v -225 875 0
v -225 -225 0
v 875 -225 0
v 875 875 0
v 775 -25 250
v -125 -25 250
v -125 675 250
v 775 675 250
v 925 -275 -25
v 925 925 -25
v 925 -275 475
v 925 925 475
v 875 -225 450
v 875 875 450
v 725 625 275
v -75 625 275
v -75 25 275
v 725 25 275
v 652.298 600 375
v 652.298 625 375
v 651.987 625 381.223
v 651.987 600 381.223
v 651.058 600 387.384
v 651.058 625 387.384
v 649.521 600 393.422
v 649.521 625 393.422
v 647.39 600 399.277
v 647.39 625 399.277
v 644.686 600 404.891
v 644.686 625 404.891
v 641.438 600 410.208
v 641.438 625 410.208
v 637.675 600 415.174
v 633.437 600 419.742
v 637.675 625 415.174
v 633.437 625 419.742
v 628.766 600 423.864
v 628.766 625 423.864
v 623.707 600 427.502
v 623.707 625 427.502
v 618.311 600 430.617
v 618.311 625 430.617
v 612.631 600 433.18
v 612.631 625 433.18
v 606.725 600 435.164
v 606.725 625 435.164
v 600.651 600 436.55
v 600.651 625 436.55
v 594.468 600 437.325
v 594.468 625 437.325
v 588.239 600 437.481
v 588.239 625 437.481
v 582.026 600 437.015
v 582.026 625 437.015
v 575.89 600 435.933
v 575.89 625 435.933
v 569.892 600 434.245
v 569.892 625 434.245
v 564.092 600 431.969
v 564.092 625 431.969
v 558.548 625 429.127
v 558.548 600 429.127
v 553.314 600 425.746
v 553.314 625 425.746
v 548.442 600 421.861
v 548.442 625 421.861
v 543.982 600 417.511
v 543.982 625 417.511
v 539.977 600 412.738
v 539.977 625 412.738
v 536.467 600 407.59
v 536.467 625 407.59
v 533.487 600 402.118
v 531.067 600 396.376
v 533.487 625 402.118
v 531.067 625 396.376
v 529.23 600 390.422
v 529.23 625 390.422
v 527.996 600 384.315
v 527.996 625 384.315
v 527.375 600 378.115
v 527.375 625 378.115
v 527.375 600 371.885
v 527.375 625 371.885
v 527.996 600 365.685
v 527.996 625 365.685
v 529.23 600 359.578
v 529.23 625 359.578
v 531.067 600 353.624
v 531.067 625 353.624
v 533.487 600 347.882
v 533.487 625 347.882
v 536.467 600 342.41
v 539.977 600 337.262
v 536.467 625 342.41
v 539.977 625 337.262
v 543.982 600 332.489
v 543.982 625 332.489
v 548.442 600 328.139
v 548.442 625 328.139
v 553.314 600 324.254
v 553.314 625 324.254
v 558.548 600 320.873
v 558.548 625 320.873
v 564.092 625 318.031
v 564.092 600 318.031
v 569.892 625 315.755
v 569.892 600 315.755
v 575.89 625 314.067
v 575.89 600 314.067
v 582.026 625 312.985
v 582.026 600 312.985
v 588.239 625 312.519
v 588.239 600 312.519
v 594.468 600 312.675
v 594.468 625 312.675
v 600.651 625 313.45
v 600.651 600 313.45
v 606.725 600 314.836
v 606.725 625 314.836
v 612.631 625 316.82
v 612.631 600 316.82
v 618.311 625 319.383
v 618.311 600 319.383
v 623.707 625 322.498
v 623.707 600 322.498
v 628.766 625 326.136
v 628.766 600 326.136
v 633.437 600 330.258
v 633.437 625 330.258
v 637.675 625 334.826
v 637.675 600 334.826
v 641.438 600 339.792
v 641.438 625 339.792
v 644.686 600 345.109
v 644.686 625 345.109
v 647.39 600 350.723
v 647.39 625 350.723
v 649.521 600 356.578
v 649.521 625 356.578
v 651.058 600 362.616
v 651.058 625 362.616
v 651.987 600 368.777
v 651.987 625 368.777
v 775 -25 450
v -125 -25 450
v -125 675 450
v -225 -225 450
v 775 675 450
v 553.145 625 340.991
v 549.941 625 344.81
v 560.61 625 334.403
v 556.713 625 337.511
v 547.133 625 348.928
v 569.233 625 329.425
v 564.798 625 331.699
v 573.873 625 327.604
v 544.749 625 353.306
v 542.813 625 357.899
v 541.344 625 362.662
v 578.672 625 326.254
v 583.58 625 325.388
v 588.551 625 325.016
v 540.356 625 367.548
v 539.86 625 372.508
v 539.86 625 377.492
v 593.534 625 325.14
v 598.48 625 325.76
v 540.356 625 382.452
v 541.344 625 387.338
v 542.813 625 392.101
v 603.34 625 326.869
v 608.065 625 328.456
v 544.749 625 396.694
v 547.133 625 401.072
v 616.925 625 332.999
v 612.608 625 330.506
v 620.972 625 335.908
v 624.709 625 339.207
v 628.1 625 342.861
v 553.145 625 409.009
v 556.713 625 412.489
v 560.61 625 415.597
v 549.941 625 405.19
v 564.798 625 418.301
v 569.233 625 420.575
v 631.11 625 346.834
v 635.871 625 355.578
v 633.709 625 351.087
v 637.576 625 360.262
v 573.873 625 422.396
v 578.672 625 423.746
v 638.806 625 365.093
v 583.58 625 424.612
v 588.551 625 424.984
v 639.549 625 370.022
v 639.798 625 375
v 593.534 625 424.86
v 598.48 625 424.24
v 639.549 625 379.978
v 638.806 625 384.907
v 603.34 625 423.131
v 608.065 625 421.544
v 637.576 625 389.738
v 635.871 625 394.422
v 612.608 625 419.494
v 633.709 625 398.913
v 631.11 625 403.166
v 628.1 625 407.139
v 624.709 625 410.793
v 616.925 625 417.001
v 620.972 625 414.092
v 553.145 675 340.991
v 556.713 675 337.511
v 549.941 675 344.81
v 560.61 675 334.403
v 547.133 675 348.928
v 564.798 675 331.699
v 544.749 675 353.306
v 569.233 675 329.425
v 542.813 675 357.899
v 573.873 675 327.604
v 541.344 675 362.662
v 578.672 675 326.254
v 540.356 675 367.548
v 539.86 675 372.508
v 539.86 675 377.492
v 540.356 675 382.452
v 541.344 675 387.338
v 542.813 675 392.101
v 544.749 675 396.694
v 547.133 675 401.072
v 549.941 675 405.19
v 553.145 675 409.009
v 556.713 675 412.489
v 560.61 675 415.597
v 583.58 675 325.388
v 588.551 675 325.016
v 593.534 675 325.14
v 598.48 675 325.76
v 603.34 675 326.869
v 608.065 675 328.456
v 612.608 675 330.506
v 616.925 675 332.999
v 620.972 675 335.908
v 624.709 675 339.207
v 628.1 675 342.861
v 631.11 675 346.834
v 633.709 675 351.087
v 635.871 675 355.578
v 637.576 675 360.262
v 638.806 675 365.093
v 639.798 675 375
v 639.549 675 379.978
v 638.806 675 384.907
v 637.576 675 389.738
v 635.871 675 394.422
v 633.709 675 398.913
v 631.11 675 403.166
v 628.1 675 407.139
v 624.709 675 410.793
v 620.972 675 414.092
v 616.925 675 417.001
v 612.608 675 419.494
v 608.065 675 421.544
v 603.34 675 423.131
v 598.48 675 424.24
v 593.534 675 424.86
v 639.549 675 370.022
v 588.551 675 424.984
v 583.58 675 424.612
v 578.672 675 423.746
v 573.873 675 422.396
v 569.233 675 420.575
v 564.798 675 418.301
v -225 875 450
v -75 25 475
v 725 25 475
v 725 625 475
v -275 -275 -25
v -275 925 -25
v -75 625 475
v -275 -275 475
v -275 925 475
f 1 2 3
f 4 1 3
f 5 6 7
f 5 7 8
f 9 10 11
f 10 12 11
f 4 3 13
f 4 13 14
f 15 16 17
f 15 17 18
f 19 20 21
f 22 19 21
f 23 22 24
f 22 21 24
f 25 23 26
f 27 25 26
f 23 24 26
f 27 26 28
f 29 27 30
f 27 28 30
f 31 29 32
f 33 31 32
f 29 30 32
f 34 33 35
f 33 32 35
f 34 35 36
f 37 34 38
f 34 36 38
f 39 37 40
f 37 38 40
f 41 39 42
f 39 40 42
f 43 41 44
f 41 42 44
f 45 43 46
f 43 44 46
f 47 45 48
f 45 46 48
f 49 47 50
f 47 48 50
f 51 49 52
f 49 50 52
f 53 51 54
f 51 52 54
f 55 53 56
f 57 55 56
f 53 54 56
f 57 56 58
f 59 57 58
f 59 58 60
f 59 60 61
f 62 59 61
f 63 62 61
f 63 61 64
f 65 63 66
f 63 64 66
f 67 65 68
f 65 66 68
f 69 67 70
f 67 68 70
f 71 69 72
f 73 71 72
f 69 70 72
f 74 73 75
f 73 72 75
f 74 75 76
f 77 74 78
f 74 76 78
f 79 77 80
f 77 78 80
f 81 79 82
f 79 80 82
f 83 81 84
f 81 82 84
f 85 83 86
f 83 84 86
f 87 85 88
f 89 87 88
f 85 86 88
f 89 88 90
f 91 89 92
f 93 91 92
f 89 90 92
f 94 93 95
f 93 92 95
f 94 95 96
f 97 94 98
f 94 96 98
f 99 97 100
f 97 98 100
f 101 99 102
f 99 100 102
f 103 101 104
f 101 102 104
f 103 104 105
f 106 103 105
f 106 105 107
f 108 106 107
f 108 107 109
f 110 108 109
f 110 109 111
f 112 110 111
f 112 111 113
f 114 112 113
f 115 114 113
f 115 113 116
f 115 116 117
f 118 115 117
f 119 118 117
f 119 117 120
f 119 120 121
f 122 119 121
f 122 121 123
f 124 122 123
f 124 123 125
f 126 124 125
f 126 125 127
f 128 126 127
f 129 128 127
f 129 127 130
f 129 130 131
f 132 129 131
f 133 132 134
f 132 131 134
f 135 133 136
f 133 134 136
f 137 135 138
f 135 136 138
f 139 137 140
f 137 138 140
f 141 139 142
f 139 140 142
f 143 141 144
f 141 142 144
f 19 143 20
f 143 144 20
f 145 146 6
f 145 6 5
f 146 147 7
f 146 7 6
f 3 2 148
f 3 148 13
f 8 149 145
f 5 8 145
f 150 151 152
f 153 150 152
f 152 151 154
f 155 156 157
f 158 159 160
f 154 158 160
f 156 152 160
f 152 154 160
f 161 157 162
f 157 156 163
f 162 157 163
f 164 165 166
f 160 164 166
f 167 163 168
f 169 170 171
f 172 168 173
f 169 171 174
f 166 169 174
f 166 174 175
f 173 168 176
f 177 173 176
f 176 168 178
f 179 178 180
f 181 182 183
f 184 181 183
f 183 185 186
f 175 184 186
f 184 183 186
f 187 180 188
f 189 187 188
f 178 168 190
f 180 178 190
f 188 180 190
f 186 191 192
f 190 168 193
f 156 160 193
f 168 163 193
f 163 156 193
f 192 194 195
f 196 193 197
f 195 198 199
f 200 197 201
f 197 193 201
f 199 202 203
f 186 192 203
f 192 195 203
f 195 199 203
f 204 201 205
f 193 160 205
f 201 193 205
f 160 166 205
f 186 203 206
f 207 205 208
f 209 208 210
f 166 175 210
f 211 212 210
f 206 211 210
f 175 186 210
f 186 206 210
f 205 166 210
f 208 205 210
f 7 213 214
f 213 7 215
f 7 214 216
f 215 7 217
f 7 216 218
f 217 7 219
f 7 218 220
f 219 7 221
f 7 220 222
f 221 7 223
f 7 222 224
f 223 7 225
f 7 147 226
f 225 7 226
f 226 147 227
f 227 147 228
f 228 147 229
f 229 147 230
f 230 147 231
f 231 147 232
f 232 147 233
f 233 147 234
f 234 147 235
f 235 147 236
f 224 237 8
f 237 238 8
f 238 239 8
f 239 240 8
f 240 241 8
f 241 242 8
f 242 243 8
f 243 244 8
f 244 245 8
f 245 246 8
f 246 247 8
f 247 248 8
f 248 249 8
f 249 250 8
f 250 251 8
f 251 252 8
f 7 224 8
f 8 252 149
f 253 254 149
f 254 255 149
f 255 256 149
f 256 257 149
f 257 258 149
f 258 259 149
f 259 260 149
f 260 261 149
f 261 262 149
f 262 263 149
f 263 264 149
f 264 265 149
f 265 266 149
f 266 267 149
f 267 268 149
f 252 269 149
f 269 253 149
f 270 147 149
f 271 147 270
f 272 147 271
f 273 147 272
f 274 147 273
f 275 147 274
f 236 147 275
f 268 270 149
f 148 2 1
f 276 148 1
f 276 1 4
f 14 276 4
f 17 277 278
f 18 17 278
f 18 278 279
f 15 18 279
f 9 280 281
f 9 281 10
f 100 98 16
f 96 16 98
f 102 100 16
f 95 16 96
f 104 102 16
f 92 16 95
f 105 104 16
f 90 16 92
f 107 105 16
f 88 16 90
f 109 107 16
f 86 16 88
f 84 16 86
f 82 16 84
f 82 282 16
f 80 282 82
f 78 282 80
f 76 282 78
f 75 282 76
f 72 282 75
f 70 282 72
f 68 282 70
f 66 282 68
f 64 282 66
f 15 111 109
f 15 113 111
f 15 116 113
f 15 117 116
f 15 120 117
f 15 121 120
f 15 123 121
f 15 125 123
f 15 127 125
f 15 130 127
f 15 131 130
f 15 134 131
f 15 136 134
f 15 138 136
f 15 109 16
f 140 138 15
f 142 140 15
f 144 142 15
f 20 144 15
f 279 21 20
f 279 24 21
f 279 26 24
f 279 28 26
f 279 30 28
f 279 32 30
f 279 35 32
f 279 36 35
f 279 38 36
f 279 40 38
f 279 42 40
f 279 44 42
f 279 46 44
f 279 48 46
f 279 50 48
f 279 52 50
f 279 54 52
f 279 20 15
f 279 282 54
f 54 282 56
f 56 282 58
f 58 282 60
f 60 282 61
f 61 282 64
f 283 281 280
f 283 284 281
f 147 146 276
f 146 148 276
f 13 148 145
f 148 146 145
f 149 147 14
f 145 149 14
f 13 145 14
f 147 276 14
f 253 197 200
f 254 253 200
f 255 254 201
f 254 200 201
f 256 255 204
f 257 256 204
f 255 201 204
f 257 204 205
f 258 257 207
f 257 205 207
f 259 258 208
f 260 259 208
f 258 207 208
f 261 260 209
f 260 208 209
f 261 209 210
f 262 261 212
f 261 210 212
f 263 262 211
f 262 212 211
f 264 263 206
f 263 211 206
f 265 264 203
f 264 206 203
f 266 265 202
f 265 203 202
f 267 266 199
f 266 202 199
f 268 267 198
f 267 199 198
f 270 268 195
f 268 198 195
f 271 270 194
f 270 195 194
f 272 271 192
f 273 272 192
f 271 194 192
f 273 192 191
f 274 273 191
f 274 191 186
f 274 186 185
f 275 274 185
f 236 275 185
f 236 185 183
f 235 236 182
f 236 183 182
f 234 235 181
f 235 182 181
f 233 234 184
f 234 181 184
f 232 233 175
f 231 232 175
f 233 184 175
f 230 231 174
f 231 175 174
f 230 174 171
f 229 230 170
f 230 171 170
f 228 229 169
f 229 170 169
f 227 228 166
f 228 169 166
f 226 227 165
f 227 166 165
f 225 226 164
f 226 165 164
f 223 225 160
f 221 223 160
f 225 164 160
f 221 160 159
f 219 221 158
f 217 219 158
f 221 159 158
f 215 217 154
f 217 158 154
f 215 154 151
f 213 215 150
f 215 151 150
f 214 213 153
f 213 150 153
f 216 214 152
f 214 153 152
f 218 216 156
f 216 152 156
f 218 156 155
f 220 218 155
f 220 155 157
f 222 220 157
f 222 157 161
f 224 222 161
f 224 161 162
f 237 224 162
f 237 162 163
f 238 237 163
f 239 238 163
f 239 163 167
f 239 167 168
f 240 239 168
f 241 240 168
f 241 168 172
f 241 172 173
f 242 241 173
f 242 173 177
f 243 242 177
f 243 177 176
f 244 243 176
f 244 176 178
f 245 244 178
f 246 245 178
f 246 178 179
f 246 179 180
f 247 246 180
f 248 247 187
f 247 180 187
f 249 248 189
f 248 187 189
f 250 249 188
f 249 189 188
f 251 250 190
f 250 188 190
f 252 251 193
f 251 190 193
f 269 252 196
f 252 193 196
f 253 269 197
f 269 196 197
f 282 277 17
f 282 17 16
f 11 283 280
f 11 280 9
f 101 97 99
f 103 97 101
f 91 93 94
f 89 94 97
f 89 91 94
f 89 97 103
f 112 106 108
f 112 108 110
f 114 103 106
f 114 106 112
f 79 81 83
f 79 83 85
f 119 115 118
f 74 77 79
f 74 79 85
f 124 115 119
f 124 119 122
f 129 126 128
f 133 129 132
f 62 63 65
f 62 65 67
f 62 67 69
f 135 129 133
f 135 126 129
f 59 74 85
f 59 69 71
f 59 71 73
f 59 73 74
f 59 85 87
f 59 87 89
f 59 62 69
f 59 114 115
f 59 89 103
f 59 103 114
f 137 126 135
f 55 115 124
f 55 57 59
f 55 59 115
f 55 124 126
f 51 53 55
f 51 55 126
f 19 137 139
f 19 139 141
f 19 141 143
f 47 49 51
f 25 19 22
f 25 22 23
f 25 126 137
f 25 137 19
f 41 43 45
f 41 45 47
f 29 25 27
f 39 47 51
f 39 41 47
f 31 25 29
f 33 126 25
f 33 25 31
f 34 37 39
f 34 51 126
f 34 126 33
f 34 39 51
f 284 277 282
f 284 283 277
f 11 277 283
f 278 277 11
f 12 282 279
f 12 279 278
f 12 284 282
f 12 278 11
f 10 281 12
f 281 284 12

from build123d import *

# Parameters (mm, degrees)
F0_W      = 1200
F0_H      = 1200
F0_W_2    = 1100
F0_H_2    = 1100
F1_DEPTH  = 450
F2_W      = 1200
F2_H      = 1200
F2_W_2    = 1100
F2_H_2    = 1100
F3_DEPTH  = 25
F4_W      = 900
F4_H      = 700
F5_DEPTH  = 200
F6_W      = 1200
F6_H      = 1200
F6_W_2    = 1100
F6_H_2    = 1100
F7_DEPTH  = 25
F8_W      = 800
F8_H      = 600
F9_DEPTH  = 200
F10_R     = 50
F11_DEPTH = 50
F12_R     = 62.5
F12_R_2   = 50
F13_DEPTH = 25


with BuildPart() as f1:
    # F0 (on Top) → F1 (new body)
    with BuildSketch(Plane.XY):
        with Locations((325, 325)):
            Rectangle(F0_W, F0_H)
        with Locations((325, 325)):
            Rectangle(F0_W_2, F0_H_2, mode=Mode.SUBTRACT)
    extrude(amount=F1_DEPTH)

    # F2 (on face) → F3 (join)
    with BuildSketch(Plane.XY.offset(450)):
        with Locations((325, 325)):
            Rectangle(F2_W, F2_H)
        with Locations((325, 325)):
            Rectangle(F2_W_2, F2_H_2, mode=Mode.SUBTRACT)
        with Locations((325, 325)):
            Rectangle(F2_W_2, F2_H_2)
    extrude(amount=F3_DEPTH)

    # F4 (on face) → F5 (join)
    with BuildSketch(Plane(origin=(0, 0, 450), x_dir=(1, 0, 0), z_dir=(0, 0, -1))):
        with Locations((325, -325)):
            Rectangle(F4_W, F4_H)
    extrude(amount=F5_DEPTH)

    # F6 (on face) → F7 (join)
    with BuildSketch(Plane(origin=(0, 0, 0), x_dir=(1, 0, 0), z_dir=(0, 0, -1))):
        with Locations((325, -325)):
            Rectangle(F6_W, F6_H)
        with Locations((325, -325)):
            Rectangle(F6_W_2, F6_H_2, mode=Mode.SUBTRACT)
        with Locations((325, -325)):
            Rectangle(F6_W_2, F6_H_2)
    extrude(amount=F7_DEPTH)

    # F8 (on face) → F9 (cut)
    with BuildSketch(Plane.XY.offset(475)):
        with Locations((325, 325)):
            Rectangle(F8_W, F8_H)
    extrude(amount=-F9_DEPTH, mode=Mode.SUBTRACT)

    # F10 (on face) → F11 (cut, through all)
    with BuildSketch(Plane.XZ.offset(-625)):
        with Locations((589.7976160049, 375)):
            Circle(F10_R)
    extrude(amount=-F11_DEPTH, mode=Mode.SUBTRACT)

    # F12 (on face) → F13 (join)
    with BuildSketch(Plane.XZ.offset(-625)):
        with Locations((589.7976160049, 375)):
            Circle(F12_R)
        with Locations((589.7976160049, 375)):
            Circle(F12_R_2, mode=Mode.SUBTRACT)
        with Locations((589.7976160049, 375)):
            Circle(F12_R_2)
    extrude(amount=F13_DEPTH)


solid = f1.part
